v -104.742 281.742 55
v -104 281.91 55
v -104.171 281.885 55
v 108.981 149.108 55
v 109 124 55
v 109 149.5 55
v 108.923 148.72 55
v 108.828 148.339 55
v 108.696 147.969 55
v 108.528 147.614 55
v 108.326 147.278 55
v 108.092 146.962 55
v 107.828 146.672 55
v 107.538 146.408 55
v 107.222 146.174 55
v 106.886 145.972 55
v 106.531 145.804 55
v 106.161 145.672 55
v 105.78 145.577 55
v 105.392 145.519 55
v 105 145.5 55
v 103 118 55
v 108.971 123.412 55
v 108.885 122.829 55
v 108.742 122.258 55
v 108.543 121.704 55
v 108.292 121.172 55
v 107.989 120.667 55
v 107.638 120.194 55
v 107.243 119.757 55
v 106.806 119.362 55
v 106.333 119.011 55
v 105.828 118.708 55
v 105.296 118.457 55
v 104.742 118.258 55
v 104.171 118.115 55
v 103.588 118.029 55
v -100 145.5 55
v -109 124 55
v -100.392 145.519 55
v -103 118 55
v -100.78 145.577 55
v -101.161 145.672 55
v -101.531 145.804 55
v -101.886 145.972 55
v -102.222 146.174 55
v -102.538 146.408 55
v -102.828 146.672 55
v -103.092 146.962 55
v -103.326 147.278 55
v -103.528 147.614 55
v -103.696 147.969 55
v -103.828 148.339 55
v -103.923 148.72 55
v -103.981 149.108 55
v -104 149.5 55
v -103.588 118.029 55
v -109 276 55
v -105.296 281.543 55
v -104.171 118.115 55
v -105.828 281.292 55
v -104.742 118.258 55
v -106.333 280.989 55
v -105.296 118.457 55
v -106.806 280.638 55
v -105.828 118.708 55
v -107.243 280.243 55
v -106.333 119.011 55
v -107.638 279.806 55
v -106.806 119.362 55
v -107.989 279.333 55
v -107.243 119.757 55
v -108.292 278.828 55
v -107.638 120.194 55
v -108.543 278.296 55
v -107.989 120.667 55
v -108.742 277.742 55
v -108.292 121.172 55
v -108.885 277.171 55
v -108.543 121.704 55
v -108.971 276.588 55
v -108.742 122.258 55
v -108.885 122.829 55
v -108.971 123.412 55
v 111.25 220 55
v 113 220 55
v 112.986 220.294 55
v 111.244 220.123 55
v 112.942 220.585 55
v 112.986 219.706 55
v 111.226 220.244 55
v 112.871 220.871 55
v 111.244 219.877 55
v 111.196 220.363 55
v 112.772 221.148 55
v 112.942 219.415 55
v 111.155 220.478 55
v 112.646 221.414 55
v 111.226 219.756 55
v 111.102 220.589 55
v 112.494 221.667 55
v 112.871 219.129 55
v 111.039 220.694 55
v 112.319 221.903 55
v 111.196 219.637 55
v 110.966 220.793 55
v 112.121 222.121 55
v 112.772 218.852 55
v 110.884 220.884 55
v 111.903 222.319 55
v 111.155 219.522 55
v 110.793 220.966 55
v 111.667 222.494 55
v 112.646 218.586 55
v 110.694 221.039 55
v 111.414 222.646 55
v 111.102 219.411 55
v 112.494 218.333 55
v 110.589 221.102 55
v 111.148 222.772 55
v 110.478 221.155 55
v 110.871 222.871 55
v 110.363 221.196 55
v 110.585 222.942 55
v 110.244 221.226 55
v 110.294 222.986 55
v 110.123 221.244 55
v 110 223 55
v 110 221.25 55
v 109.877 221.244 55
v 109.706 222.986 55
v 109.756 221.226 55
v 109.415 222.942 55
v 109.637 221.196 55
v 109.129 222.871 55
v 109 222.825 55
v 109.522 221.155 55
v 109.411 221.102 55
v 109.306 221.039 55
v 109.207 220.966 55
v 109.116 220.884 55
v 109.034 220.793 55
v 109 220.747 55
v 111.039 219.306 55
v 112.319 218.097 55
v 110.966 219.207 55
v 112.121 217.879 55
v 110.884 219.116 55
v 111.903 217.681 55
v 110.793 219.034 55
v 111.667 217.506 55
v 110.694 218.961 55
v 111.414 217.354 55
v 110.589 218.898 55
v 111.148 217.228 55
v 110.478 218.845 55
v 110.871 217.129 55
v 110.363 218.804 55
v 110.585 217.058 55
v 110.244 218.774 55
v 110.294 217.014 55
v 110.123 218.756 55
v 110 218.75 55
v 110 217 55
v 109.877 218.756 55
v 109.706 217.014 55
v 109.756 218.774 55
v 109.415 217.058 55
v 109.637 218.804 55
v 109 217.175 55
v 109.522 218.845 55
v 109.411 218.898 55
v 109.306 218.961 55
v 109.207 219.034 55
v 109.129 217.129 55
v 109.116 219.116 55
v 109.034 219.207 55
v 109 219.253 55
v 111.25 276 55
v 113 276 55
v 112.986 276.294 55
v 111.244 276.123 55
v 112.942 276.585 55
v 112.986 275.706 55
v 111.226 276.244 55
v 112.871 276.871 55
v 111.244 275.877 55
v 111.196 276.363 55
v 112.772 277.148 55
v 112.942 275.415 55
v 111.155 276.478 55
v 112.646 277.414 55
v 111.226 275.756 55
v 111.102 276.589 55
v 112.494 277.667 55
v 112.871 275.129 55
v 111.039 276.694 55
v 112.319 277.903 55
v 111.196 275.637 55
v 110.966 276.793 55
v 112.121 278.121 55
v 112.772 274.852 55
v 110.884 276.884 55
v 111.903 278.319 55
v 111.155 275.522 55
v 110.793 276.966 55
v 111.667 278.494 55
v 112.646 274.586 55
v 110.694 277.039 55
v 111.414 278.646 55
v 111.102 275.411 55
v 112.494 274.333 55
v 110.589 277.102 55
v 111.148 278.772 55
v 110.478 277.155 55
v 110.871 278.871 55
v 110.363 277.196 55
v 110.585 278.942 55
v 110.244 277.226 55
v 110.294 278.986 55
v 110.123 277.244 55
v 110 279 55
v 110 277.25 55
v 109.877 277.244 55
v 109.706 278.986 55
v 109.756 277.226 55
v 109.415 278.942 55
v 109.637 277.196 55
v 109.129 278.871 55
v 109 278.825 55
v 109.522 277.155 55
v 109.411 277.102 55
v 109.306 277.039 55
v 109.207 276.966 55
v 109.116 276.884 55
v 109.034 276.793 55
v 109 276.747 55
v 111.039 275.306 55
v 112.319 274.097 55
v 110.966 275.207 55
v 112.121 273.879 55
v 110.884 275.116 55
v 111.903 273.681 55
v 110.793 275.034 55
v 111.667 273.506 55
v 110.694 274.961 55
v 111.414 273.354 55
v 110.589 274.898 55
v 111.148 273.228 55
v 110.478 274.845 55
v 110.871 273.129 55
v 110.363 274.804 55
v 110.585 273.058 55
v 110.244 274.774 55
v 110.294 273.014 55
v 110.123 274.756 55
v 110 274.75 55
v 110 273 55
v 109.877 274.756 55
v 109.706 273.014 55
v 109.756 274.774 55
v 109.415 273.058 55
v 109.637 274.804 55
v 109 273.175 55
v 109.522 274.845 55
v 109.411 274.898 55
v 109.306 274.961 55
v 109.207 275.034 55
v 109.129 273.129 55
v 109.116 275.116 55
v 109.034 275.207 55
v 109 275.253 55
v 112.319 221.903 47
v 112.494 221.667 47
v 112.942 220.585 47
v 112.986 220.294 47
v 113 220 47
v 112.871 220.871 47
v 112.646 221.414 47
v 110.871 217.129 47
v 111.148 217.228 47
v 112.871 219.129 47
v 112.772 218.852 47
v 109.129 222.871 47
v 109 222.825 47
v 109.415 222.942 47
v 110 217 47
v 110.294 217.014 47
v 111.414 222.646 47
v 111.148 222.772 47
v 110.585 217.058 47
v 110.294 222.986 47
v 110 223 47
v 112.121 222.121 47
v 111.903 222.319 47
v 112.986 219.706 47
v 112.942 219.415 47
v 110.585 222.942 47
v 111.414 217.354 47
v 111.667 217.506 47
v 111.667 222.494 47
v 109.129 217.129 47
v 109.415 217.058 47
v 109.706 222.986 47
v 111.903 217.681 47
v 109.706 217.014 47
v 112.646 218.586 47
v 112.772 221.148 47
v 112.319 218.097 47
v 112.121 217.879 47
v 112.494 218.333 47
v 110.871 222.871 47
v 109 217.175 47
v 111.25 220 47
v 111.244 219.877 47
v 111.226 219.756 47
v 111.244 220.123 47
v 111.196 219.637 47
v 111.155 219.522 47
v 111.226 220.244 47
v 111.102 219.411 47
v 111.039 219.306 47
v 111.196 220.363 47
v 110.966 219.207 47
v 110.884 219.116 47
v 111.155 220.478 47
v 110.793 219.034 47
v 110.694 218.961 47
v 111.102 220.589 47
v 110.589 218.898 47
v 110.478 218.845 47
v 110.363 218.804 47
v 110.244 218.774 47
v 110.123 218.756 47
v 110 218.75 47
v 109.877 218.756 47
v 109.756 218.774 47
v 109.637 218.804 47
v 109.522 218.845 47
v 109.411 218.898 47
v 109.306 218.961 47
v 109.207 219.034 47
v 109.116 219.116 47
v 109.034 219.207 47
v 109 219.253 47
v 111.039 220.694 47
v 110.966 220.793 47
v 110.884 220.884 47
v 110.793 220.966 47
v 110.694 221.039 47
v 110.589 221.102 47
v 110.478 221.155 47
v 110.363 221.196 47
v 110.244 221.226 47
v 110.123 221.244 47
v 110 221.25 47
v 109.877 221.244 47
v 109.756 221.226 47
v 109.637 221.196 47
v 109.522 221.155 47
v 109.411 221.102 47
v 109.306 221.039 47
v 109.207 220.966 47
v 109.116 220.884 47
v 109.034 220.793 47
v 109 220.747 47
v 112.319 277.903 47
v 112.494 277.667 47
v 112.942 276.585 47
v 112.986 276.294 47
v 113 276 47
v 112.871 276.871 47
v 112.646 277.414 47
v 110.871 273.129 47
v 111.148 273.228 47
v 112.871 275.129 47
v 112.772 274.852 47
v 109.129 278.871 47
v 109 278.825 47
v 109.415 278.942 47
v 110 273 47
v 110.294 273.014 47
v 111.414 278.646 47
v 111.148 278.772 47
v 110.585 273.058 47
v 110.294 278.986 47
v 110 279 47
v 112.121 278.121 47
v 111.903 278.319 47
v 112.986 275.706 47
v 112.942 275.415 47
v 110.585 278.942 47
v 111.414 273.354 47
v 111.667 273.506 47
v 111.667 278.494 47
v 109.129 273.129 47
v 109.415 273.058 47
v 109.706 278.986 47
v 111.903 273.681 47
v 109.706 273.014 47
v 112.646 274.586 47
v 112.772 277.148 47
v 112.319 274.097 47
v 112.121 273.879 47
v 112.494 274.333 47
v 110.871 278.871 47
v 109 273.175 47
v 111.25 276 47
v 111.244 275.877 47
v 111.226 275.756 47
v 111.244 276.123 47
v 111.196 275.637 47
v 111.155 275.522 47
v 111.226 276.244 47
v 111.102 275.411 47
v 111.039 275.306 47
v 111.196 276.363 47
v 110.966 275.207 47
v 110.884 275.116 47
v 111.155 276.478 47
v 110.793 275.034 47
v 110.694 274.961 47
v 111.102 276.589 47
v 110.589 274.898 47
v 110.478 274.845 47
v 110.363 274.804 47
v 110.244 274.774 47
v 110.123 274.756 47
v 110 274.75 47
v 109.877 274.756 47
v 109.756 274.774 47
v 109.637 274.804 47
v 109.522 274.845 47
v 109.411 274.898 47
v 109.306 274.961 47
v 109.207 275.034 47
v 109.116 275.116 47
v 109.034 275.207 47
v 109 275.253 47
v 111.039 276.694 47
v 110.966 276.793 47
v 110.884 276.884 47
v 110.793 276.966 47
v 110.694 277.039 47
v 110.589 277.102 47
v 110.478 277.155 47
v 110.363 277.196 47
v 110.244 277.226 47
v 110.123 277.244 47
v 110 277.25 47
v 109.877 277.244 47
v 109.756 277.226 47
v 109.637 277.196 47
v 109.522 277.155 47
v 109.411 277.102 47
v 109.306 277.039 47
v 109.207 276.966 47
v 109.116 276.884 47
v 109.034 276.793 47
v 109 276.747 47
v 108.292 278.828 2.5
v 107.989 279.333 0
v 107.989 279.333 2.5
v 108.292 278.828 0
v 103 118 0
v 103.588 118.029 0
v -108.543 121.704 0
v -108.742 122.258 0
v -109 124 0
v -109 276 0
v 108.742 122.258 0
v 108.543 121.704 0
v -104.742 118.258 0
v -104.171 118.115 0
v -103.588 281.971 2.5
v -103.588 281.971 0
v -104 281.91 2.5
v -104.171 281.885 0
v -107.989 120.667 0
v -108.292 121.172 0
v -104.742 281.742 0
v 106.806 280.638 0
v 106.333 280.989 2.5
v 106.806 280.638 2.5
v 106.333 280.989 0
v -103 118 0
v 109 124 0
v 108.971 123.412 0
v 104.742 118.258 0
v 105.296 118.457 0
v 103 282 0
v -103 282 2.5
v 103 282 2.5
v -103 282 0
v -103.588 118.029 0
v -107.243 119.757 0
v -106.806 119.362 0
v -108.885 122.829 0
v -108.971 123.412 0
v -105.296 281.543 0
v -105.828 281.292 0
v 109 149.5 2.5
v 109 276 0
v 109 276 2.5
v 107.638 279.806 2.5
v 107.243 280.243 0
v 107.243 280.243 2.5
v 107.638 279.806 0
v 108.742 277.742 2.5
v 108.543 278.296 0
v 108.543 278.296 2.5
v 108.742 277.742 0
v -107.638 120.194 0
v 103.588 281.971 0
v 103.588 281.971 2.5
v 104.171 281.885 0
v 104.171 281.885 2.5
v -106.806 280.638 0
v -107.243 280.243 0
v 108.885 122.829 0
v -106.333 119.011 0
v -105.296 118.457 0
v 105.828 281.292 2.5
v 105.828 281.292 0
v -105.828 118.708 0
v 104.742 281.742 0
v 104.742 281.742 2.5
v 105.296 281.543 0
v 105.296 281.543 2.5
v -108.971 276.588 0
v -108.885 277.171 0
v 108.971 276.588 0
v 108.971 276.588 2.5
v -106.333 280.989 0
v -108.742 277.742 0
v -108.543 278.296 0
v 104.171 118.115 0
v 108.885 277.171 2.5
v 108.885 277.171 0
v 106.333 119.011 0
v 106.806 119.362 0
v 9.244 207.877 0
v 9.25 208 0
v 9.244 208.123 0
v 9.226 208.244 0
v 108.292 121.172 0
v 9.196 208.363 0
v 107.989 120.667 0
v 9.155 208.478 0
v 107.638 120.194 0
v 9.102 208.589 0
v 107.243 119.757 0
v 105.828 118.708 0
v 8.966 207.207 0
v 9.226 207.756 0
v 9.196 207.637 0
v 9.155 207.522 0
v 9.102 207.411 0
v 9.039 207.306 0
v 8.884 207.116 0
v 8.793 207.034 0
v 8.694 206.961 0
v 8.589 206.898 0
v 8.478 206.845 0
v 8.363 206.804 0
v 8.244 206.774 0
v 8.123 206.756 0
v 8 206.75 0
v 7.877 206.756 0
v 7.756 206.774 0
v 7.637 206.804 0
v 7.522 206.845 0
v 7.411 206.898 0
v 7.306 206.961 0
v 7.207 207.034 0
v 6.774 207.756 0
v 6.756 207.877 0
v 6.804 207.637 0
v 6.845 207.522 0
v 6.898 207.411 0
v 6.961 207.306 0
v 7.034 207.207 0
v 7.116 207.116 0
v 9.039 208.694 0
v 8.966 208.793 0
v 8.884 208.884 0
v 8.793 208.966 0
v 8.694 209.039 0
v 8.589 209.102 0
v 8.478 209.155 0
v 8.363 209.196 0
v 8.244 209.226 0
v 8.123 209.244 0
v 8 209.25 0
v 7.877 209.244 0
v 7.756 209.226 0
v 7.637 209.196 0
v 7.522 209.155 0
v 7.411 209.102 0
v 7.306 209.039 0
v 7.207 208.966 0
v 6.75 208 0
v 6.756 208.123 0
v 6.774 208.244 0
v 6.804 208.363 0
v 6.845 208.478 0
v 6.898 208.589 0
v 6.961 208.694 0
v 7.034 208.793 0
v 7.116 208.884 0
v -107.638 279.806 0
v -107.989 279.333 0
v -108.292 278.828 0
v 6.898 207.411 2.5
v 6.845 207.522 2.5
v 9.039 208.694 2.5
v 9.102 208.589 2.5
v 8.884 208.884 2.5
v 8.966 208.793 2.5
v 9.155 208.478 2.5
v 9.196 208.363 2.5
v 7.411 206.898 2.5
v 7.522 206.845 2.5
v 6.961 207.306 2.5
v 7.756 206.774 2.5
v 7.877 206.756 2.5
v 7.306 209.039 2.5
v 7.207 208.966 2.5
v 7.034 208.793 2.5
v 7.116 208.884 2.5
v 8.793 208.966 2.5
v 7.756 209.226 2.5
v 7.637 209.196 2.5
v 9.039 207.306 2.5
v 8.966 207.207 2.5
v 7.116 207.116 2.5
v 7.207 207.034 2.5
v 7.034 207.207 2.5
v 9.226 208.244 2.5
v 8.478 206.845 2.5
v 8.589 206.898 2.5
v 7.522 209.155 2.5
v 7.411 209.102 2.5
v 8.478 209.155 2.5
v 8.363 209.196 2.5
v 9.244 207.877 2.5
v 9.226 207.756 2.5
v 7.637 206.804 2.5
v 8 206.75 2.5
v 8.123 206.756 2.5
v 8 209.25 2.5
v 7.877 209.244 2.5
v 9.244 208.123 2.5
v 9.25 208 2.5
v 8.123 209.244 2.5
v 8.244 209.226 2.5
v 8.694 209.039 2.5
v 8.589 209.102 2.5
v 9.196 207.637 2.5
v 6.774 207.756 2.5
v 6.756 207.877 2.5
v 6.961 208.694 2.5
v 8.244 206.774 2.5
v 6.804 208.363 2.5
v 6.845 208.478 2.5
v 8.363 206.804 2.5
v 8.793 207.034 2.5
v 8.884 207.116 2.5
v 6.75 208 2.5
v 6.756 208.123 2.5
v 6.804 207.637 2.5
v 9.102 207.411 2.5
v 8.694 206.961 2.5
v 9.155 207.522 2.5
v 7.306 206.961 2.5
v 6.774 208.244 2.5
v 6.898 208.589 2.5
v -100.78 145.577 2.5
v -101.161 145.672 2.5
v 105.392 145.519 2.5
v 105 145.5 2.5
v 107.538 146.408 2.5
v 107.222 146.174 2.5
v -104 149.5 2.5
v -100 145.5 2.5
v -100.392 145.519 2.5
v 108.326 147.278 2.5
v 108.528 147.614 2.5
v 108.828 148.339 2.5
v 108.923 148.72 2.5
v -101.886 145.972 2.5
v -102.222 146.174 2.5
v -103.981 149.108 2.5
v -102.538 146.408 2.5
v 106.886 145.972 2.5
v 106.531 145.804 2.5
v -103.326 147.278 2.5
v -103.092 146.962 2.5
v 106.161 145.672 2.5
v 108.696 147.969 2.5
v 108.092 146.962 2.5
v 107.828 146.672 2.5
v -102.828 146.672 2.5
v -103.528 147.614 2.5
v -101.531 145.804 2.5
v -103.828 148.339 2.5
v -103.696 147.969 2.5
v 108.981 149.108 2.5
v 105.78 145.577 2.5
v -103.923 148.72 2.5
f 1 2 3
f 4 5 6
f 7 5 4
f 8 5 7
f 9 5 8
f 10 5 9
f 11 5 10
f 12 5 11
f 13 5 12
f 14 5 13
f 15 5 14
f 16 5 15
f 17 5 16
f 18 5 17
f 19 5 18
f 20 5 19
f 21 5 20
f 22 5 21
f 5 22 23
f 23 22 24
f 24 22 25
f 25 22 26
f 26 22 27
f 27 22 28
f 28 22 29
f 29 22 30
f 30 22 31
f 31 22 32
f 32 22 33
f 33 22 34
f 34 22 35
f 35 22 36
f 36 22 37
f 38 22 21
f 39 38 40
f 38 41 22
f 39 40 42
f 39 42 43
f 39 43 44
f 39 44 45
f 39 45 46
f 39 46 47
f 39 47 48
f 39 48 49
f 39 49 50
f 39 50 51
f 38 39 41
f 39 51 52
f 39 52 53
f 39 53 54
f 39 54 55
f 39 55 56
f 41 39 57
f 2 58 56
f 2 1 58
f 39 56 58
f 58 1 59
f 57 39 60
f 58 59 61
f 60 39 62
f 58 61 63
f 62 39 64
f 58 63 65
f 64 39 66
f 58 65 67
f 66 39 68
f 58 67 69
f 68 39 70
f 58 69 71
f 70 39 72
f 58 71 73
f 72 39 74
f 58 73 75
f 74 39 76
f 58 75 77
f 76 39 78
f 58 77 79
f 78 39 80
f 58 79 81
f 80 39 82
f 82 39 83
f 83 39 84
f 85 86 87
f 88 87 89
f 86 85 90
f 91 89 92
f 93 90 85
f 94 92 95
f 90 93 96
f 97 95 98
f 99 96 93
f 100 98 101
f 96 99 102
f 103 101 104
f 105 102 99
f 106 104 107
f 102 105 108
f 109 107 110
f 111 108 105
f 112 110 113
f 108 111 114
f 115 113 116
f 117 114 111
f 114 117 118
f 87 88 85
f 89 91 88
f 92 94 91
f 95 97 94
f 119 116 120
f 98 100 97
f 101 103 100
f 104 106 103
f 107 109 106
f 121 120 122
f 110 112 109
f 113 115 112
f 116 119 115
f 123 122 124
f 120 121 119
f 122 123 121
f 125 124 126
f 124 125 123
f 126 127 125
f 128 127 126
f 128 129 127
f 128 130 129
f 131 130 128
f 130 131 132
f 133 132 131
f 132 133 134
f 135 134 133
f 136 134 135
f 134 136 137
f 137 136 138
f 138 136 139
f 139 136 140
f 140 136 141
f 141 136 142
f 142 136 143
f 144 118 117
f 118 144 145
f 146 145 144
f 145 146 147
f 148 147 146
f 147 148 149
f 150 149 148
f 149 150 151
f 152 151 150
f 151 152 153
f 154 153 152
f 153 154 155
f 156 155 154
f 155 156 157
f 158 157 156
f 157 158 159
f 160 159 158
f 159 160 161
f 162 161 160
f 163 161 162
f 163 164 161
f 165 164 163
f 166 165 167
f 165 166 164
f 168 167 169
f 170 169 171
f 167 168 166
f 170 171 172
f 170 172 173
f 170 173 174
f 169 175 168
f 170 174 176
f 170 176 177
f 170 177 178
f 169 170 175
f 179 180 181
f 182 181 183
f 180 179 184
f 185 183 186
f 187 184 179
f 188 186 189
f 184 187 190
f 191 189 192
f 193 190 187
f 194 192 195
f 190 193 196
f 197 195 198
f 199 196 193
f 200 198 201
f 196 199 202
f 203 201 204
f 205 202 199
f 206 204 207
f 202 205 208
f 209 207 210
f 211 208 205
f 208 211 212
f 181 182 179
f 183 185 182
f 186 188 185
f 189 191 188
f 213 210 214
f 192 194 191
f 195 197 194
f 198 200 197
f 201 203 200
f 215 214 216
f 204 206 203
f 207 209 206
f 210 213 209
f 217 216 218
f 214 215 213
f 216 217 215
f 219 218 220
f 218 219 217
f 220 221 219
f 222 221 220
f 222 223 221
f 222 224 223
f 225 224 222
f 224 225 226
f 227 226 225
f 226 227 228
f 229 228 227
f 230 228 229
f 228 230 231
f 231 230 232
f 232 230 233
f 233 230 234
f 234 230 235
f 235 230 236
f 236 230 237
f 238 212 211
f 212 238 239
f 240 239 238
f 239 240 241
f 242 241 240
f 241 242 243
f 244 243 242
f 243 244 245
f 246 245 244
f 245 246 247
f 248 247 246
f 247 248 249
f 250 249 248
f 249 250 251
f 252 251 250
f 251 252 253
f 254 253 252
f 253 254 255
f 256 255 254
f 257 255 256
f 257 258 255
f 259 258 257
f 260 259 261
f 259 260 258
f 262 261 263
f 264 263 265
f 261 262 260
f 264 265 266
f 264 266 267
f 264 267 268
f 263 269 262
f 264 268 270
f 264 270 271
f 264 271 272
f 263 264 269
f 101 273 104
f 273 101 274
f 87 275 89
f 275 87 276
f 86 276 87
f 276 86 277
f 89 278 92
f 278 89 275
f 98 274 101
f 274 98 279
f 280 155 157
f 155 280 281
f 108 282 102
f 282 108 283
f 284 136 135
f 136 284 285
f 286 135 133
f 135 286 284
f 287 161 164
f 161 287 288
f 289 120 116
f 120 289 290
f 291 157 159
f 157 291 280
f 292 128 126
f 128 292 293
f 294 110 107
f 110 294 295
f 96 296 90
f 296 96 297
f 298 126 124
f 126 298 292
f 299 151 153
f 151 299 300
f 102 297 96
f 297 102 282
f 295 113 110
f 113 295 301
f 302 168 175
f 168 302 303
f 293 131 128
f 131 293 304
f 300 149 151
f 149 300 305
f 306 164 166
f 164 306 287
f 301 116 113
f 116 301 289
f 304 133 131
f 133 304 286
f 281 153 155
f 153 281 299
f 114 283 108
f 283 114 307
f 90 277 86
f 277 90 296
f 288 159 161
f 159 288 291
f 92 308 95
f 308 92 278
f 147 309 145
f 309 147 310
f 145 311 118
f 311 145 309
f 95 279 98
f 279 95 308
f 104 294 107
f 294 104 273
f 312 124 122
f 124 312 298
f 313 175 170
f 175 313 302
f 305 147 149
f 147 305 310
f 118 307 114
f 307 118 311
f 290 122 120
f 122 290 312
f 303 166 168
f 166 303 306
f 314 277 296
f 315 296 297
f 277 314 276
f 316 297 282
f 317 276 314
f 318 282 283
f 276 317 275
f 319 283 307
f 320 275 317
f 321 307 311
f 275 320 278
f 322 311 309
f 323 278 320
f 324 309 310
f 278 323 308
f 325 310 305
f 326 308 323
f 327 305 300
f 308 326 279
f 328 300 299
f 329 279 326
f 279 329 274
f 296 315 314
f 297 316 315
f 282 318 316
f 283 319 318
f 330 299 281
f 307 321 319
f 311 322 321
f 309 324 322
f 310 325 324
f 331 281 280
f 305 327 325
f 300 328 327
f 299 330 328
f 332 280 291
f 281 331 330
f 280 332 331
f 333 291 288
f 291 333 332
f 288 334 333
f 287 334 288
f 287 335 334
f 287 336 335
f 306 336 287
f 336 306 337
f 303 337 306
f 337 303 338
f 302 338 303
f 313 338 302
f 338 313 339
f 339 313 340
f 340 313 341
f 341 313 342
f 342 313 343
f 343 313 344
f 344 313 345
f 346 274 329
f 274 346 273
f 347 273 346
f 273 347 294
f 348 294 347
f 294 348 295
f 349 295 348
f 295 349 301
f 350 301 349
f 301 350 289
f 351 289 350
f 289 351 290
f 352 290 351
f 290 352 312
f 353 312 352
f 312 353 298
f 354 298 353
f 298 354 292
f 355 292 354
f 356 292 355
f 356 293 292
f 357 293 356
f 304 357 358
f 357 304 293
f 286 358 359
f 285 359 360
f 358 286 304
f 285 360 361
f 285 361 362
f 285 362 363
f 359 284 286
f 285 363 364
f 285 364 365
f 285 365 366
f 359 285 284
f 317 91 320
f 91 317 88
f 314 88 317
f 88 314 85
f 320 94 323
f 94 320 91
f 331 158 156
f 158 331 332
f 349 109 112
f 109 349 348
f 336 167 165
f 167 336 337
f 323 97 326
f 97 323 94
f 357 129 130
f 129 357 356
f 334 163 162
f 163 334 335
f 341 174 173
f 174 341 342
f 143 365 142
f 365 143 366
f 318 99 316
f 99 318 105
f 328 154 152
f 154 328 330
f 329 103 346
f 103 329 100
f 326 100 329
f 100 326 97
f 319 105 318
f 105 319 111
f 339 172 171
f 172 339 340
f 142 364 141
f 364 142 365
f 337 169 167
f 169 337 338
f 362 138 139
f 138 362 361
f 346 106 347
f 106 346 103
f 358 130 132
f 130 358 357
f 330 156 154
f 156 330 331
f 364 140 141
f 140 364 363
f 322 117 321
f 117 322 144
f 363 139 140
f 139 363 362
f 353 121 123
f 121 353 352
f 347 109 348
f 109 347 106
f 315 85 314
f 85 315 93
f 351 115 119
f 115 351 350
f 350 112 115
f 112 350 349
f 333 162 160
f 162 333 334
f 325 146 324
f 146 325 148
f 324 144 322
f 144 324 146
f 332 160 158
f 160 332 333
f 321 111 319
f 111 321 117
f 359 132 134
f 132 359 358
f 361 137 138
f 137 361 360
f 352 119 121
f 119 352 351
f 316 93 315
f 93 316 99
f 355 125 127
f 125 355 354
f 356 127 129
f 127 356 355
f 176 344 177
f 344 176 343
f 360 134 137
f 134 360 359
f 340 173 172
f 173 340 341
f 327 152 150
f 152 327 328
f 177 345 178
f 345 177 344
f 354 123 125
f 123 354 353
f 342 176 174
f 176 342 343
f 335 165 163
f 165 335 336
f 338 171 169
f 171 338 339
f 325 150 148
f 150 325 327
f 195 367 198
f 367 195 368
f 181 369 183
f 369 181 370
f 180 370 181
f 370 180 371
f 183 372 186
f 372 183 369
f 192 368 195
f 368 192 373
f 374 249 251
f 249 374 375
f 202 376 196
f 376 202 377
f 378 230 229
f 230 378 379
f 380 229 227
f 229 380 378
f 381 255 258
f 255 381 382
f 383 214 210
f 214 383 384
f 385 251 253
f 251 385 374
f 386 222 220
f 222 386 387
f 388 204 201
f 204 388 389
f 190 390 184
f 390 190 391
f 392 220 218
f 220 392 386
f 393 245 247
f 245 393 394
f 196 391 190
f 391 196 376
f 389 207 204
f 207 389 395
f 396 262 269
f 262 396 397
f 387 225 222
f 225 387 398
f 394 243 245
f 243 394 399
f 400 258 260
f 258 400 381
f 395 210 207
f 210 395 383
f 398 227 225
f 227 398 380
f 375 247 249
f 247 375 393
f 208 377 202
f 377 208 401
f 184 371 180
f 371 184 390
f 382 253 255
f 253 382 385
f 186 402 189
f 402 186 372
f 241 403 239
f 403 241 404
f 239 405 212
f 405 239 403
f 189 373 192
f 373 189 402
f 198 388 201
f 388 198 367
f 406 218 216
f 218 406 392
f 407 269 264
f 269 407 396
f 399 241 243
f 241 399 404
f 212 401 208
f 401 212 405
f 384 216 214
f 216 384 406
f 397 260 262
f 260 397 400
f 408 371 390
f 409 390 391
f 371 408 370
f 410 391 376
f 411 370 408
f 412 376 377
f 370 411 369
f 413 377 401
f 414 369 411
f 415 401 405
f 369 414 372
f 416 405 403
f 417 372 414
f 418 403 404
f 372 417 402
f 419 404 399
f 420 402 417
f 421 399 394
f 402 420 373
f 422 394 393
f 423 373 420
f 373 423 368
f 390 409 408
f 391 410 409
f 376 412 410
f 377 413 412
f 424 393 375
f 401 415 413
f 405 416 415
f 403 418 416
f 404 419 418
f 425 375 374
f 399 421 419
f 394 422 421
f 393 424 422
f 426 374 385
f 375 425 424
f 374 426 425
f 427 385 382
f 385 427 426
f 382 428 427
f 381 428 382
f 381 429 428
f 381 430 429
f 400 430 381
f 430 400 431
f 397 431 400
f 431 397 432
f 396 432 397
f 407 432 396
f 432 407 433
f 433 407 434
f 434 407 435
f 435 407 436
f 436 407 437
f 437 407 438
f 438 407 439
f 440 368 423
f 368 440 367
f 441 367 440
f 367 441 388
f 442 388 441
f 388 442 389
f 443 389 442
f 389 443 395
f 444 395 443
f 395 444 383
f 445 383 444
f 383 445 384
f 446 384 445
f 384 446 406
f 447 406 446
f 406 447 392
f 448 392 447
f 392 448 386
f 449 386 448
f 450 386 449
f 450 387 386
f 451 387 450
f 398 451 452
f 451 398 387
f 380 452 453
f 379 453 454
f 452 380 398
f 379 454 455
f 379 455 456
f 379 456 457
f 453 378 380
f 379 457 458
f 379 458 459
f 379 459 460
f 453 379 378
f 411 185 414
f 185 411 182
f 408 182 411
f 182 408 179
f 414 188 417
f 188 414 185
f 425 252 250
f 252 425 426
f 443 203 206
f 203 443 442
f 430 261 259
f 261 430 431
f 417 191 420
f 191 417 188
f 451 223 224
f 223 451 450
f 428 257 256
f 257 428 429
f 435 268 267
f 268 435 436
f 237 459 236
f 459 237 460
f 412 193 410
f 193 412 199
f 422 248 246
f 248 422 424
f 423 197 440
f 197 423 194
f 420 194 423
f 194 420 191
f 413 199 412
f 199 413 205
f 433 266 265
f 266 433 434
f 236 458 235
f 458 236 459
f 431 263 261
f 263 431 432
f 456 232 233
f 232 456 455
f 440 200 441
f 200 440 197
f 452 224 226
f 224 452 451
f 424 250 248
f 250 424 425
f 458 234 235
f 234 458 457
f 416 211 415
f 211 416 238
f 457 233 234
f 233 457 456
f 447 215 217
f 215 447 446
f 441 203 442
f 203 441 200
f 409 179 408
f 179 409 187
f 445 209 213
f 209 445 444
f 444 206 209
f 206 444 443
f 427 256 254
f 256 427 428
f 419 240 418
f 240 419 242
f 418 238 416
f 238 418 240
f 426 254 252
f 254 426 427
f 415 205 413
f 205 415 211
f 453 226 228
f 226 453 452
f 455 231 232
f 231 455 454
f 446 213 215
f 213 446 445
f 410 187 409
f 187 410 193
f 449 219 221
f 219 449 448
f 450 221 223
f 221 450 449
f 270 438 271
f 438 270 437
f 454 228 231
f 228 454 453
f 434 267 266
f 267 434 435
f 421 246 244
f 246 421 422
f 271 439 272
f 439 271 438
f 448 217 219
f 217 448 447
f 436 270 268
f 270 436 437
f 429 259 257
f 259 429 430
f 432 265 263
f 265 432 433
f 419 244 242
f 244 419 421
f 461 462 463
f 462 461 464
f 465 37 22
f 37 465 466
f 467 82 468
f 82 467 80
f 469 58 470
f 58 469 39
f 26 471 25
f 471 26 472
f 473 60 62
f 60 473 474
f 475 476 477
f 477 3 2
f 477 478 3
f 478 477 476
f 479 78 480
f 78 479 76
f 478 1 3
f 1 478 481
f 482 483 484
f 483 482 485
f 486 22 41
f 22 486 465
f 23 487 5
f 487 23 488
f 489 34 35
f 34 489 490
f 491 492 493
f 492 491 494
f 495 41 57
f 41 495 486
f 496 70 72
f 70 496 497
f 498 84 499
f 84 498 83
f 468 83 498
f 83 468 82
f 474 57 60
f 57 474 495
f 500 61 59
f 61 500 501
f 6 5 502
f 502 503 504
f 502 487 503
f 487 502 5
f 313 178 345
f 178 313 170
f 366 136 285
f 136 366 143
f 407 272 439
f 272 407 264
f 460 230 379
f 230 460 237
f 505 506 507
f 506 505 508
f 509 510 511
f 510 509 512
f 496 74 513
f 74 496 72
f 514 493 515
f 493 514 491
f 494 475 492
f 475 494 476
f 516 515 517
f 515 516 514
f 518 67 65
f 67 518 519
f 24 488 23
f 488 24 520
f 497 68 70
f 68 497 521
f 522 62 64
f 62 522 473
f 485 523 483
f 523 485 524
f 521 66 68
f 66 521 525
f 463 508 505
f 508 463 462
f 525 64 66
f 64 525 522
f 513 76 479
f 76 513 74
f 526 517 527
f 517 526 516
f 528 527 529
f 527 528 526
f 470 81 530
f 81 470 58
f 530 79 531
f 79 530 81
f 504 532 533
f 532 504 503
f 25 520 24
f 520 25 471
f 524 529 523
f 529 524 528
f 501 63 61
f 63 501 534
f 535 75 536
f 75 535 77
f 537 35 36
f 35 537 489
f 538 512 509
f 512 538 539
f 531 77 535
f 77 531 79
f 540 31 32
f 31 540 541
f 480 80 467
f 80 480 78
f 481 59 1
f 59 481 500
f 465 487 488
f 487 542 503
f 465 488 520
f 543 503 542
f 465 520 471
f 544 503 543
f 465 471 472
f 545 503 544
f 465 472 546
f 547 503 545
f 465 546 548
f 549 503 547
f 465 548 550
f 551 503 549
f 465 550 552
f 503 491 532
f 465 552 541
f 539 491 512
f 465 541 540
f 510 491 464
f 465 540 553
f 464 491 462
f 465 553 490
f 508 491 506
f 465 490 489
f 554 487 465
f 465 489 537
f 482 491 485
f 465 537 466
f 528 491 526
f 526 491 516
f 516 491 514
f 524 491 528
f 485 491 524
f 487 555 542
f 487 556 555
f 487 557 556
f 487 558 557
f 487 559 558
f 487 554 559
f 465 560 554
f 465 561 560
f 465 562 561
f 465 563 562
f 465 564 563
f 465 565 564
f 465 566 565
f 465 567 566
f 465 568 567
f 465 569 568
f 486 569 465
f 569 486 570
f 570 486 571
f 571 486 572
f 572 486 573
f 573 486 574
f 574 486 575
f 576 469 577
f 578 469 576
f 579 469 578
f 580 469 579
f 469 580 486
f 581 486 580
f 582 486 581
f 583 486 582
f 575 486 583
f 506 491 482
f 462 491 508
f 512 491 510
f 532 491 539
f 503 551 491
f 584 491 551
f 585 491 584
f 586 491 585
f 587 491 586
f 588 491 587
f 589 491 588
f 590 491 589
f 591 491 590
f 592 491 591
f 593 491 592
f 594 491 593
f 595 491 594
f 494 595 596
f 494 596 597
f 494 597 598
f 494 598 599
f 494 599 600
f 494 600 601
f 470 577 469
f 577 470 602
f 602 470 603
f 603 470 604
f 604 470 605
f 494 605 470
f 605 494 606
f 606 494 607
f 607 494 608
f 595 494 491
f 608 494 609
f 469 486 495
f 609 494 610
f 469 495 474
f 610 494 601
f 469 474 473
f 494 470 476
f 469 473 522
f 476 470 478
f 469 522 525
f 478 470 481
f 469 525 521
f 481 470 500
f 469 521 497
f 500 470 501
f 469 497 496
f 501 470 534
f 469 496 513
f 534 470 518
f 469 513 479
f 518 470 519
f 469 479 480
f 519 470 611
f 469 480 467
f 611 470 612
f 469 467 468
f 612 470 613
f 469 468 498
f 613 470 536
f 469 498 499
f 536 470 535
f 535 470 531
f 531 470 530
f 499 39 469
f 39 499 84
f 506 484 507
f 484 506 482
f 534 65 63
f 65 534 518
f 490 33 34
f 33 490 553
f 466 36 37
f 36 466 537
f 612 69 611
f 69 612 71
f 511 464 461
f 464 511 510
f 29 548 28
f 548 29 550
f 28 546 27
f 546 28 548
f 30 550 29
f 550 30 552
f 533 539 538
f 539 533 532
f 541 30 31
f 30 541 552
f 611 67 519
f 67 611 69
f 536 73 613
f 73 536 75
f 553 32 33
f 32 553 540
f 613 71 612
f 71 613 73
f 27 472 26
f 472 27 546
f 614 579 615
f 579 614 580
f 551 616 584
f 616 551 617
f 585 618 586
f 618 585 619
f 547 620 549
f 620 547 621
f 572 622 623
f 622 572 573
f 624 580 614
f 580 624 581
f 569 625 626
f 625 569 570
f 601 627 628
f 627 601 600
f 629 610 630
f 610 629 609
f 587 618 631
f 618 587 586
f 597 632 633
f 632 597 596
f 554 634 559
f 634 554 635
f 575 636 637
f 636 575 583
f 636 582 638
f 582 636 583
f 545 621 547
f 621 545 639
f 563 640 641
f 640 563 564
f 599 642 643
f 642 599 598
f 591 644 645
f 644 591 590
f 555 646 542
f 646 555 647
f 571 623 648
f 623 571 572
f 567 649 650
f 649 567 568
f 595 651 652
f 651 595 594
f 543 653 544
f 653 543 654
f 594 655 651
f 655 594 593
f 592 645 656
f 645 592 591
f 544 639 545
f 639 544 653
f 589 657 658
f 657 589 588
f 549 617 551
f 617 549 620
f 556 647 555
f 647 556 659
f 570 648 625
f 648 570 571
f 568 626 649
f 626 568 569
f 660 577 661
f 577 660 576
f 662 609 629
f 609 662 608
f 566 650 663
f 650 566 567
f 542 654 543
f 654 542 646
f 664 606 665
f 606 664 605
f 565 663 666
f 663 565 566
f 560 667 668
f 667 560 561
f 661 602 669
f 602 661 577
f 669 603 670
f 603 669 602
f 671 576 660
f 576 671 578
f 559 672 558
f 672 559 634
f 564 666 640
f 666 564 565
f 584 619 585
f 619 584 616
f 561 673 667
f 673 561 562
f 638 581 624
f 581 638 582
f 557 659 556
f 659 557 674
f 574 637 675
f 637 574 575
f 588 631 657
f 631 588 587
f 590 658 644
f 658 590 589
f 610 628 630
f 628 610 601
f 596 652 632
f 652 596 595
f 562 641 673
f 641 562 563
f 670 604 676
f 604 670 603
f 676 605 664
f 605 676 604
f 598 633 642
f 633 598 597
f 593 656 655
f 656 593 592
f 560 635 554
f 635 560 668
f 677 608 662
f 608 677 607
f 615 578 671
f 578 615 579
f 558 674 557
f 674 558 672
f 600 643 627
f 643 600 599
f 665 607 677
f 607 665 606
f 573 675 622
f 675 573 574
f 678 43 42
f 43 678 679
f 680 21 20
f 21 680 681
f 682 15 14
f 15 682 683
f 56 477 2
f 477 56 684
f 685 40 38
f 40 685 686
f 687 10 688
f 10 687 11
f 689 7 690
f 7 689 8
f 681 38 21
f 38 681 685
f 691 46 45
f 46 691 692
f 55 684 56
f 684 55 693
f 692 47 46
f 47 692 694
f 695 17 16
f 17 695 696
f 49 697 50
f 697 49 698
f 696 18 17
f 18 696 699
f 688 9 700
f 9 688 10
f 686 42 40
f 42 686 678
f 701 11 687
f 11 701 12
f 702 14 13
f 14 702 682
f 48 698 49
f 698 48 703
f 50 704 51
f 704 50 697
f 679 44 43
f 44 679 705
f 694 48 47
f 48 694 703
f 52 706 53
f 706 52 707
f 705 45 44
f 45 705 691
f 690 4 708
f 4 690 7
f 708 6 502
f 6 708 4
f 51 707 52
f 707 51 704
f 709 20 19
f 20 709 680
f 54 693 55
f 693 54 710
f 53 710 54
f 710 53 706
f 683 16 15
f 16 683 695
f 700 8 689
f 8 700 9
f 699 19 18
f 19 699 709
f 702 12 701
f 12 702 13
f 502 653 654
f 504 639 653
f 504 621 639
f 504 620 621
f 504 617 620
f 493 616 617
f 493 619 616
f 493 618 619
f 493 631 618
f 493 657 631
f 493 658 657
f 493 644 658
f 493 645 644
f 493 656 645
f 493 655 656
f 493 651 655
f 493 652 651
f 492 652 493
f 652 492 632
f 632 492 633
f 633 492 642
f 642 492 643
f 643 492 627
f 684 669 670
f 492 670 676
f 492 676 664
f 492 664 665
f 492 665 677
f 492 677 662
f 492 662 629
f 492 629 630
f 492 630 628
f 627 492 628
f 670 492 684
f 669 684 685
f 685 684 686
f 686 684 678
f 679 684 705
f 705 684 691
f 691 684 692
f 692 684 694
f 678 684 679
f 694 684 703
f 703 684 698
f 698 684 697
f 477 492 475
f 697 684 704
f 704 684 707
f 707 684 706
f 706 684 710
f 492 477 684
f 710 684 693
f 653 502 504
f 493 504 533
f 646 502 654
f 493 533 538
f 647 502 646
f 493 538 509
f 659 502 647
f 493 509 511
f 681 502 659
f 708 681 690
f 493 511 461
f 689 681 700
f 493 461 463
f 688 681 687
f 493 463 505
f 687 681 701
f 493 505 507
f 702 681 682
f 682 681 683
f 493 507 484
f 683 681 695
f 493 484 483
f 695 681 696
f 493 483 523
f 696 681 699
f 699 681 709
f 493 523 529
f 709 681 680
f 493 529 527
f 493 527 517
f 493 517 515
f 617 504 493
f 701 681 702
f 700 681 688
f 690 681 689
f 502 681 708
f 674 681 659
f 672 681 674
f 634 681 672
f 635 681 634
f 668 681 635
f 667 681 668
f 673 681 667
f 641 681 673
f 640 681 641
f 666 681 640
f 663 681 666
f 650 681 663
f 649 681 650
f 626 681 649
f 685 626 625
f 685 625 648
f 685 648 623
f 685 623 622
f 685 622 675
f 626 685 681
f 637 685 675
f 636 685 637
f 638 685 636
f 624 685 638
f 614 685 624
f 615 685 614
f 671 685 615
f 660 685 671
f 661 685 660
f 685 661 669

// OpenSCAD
// ── EduPulse Kiosk Enclosure ──
// Raspberry Pi 4/5 + 7" Touchscreen + Camera mount
// Print on 220x220mm bed in 2 parts (front/back)

$fn = 64;

// ── Dimensions ──
SCREEN_W = 194;  // 7" display visible area
SCREEN_H = 110;
SCREEN_R = 4;    // corner radius

BEZEL = 12;      // border around screen
DEPTH = 55;      // internal depth
WALL = 2.5;

CAM_D = 12;      // camera hole diameter
CAM_X = 80;      // camera offset from center

VENT_W = 3;
VENT_GAP = 4;

// ── Front Panel ──
module front() {
  W = SCREEN_W + BEZEL * 2;
  H = SCREEN_H + BEZEL * 2 + 30;  // extra chin for branding

  difference() {
    // Main body
    rounded_rect(W, H, DEPTH, SCREEN_R + 2);

    // Screen cutout
    translate([BEZEL, BEZEL + 15, WALL])
      rounded_rect(SCREEN_W, SCREEN_H, DEPTH, SCREEN_R);

    // Camera hole (top center-right)
    translate([W/2 + CAM_X, BEZEL - 2, -1])
      cylinder(d = CAM_D, h = WALL + 2);

    // Speaker grille (bottom-left)
    for (i = [0:5]) {
      translate([15 + i * (VENT_W + VENT_GAP), H - 25, -1])
        cube([VENT_W, 20, WALL + 2]);
    }

    // LED indicator hole
    translate([W - 20, BEZEL + 5, -1])
      cylinder(d = 3, h = WALL + 2);

    // Screw bosses (countersink)
    for (x = [8, W - 8], y = [8, H - 8])
      translate([x, y, -1])
        cylinder(d1 = 6, d2 = 3.5, h = WALL + 2);
  }

  // Screen bezel lip
  %translate([BEZEL - 1, BEZEL + 14, WALL])
    linear_extrude(2)
      offset(r = -1)
        rounded_square(SCREEN_W + 2, SCREEN_H + 2, SCREEN_R);
}

// ── Back Panel ──
module back() {
  W = SCREEN_W + BEZEL * 2;
  H = SCREEN_H + BEZEL * 2 + 30;

  difference() {
    union() {
      // Main body
      rounded_rect(W, H, DEPTH, SCREEN_R + 2);

      // Pi standoffs
      pi_standoffs();
    }

    // Interior hollow
    translate([WALL, WALL + 15, WALL])
      rounded_rect(W - WALL*2, H - WALL*2 - 15, DEPTH, SCREEN_R);

    // Ventilation slots (top)
    for (i = [0:14]) {
      translate([15 + i * (VENT_W + VENT_GAP), H - 8, DEPTH/2])
        cube([VENT_W, 12, WALL + 2]);
    }

    // Power button hole
    translate([W/2, 5, DEPTH/2])
      cylinder(d = 8, h = WALL + 2);

    // USB/HDMI cutout
    translate([W - 30, 10, DEPTH/2 - 10])
      cube([20, 30, WALL + 2]);

    // Screw holes
    for (x = [8, W - 8], y = [8, H - 8])
      translate([x, y, -1])
        cylinder(d = 2.5, h = DEPTH + 2);
  }
}

// ── Helpers ──
module rounded_rect(w, h, d, r) {
  linear_extrude(d)
    rounded_square(w, h, r);
}

module rounded_square(w, h, r) {
  offset(r = r)
    square([w - r*2, h - r*2], center = true);
}

module pi_standoffs() {
  // Pi 4/5 mounting holes (centered on board)
  pi_w = 85;
  pi_h = 56;
  off_x = 25;
  off_y = 20;

  for (x = [off_x, off_x + pi_w], y = [off_y, off_y + pi_h]) {
    translate([x, y, DEPTH - 8])
      difference() {
        cylinder(d = 6, h = 8);
        translate([0, 0, -1])
          cylinder(d = 2.5, h = 10);
      }
  }
}

// ── Render ──
// Uncomment to render individual parts
// front();
translate([0, 200, 0]) back();
